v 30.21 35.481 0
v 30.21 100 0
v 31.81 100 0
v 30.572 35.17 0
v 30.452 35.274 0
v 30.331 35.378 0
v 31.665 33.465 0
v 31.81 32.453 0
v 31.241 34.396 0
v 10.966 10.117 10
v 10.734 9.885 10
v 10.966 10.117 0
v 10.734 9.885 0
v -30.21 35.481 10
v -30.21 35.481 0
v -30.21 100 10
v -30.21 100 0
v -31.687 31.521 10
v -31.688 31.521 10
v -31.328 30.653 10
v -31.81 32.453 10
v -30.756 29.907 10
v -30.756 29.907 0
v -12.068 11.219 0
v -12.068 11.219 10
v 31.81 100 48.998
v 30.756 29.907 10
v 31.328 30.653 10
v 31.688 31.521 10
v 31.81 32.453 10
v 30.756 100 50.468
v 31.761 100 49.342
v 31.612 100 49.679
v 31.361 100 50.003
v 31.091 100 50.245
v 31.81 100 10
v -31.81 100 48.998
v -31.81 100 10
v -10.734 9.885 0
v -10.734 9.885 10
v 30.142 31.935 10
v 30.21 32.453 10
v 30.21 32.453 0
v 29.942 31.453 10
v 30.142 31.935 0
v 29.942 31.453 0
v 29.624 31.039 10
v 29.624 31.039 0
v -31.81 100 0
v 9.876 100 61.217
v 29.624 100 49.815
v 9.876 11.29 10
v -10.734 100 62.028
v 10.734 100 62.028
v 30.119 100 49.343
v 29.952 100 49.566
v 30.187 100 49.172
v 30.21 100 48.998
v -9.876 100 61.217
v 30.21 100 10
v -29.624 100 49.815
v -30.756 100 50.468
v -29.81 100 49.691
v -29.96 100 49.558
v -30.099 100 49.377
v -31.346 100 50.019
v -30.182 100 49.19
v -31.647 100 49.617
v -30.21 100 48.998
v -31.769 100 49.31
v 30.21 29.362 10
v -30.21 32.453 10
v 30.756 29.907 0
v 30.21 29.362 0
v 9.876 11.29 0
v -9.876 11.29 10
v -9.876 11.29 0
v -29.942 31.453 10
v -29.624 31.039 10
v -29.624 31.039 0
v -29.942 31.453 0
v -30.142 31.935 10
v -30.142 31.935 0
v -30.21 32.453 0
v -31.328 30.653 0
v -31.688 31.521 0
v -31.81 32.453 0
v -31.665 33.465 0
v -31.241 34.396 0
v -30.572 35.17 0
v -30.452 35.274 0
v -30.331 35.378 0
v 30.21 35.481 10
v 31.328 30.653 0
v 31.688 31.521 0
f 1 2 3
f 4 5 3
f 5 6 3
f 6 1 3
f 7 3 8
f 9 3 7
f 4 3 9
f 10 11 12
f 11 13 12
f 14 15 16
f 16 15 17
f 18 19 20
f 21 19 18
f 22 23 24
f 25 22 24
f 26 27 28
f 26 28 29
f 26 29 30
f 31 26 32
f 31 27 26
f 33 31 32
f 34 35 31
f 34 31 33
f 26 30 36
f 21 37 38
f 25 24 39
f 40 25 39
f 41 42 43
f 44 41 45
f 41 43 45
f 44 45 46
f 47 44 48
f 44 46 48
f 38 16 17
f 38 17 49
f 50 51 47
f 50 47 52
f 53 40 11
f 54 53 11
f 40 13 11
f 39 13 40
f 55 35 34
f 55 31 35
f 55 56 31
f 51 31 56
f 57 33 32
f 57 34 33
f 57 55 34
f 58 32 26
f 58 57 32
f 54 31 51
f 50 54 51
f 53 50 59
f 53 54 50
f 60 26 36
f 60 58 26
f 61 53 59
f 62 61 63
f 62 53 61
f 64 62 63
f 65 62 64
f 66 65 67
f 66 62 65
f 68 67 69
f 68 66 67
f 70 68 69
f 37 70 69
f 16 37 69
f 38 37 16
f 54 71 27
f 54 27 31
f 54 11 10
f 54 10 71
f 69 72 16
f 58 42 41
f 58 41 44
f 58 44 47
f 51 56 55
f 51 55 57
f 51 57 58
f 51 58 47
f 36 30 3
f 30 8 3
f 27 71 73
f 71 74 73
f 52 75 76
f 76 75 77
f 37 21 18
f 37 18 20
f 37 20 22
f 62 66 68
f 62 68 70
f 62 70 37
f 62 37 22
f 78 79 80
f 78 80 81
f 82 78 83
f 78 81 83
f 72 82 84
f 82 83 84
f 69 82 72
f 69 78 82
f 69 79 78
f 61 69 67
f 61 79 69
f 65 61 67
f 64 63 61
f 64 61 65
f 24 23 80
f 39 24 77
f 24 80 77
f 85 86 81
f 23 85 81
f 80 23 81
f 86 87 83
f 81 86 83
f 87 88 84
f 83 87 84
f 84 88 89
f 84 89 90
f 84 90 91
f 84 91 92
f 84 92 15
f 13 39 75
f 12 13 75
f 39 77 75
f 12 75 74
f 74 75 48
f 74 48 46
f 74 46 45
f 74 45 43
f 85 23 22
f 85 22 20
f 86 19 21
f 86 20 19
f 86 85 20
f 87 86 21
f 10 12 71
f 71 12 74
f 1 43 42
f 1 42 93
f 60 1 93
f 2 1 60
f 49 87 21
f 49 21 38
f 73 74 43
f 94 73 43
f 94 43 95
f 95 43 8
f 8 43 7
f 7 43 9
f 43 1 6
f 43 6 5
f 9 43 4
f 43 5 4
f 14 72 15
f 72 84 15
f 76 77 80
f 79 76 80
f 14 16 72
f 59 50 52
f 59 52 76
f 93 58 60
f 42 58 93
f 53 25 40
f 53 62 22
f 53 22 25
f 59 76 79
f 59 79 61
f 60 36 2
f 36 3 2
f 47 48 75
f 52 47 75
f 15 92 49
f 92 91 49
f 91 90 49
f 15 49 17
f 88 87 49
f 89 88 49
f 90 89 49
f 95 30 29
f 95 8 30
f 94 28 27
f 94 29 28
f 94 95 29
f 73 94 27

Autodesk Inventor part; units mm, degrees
ref_plane "YZ Plane" through (0, 0, 0) normal (1, 0, 0) x (0, 1, 0)
sketch "Boceto1" plane through (0, 0, 0) normal (0, 0, 1) x (1, 0, 0)
  circle A0 centre (-50, -88) radius 1.5 projected
  circle A1 centre (50, -88) radius 1.5 projected
  circle A2 centre (88, -50) radius 1.5 projected
  circle A3 centre (88, 50) radius 1.5 projected
  circle A4 centre (50, 88) radius 1.5 projected
  circle A5 centre (-50, 88) radius 1.5 projected
  circle A6 centre (-88, 50) radius 1.5 projected
  circle A7 centre (-88, -50) radius 1.5 projected
  arc A8 (29.6244, 31.0386) -> (29.5223, 33.9623) centre (28.2102, 32.4528) ccw projected
  line L0 (29.6244, 31.0386) -> (9.8759, 11.2901) projected
  line L1 (-9.8759, 11.2901) -> (-29.6244, 31.0386) projected
  arc A9 (-29.5223, 33.9623) -> (-29.6244, 31.0386) centre (-28.2102, 32.4528) ccw projected
  arc A10 (29.5223, 33.9623) -> (-29.5223, 33.9623) centre (0, 0) ccw projected
  line L2 (100, -100) -> (100, 100) projected
  line L3 (100, 100) -> (-100, 100) projected
  line L4 (-100, 100) -> (-100, -100) projected
  line L5 (-100, -100) -> (100, -100) projected
  line L6 (10.7339, 9.8854) -> (30.7558, 29.9072)
  arc A11 (30.7558, 29.9072) -> (30.572, 35.1698) centre (28.2102, 32.4528) ccw
  arc A12 (30.572, 35.1698) -> (-30.572, 35.1698) centre (0, 0) ccw
  arc A13 (-30.572, 35.1698) -> (-30.7558, 29.9072) centre (-28.2102, 32.4528) ccw
  line L7 (-30.7558, 29.9072) -> (-12.0679, 11.2194)
  line L8 (31.8102, 5.2085) -> (31.8102, 100)
  line L9 (30.2102, 29.3617) -> (30.2102, 100)
  line L10 (-31.8102, 32.4528) -> (-31.8102, 100)
  line L11 (-30.2102, 31.7383) -> (-30.2102, 100)
  circle A14 centre (55, 0) radius 2.5 projected
  arc A15 (-5.2203, -12.3413) -> (5.2203, -12.3413) centre (0, 0) ccw projected
  arc A16 (54.4847, -4.9734) -> (5.2203, -12.3413) centre (44.1778, -104.4408) ccw projected
  arc A17 (54.4847, -4.9734) -> (54.4847, 4.9734) centre (55, 0) ccw projected
  arc A18 (11.6313, 9.8854) -> (54.4847, 4.9734) centre (44.1778, 104.4408) ccw projected
  arc A19 (-54.4847, 4.9734) -> (-11.6313, 9.8854) centre (-44.1778, 104.4408) ccw projected
  arc A20 (-54.4847, 4.9734) -> (-54.4847, -4.9734) centre (-55, 0) ccw projected
  arc A21 (-5.2203, -12.3413) -> (-54.4847, -4.9734) centre (-44.1778, -104.4408) ccw projected
  circle A22 centre (0, 0) radius 4 projected
  circle A23 centre (-55, 0) radius 2.5 projected
  arc A24 (9.8759, 11.2901) -> (-9.8759, 11.2901) centre (0, 0) ccw
  line L12 (-30.7558, 29.9072) -> (-10.7339, 9.8854)
  arc A25 (5.2203, 12.3413) -> (-5.2203, 12.3413) centre (0, 0) ccw
  line L13 (10.9657, 10.1171) -> (30.7558, 29.9072)
  arc A26 (30.7558, 29.9072) -> (30.572, 35.1698) centre (28.2102, 32.4528) ccw
  arc A27 (30.572, 35.1698) -> (-30.572, 35.1698) centre (0, 0) ccw
  arc A28 (-30.572, 35.1698) -> (-30.7558, 29.9072) centre (-28.2102, 32.4528) ccw
  line L14 (11.6313, 9.8854) -> (-11.6313, 9.8854) projected
  line L15 (9.8759, 11.2901) -> (-9.8759, 11.2901)
  point P0 (-30.2102, 32.4528)
  point P1 (30.2102, 32.4528)
  point P2 (31.8102, 32.4528)
  point P3 (-30.2102, 35.4811)
  point P4 (31.8102, 32.4528)
  point P5 (30.2102, 35.4811)
  point P6 (44.1778, 104.4408)
  point P7 (-44.1778, 104.4408)
  dimension "d0" = 1.6
ref_plane "Plano de trabajo1" through (-60, -15, 10) normal (0, 0, 1) x (1, 0, 0)
ref_plane "Plano de trabajo3" through (-60, -13.4, 10) normal (0, 0, 1) x (1, 0, 0)
extrude "Extrusión1" add sketch "Boceto1" along normal up to surface (10 mm away) contours A8 L9 L6 L14 L12 L7 A13 A12 L11 A9 L1 L15 L0 | L9 A12 A11 L6 | L9 L3 L8 A11 A12 | A12 A13 L10 L3 L11
ref_plane "Plano de trabajo5" through (0, 32.4528, 0) normal (-1, 0, 0) x (0, 0, 1)
sketch "Boceto4" plane through (0, 32.4528, 0) normal (-1, 0, 0) x (0, 0, 1)
  line L0 (10, -1.4142) -> (10, -21.1627) projected
  line L1 (10, 0) -> (10, -1.4142) projected
  line L2 (10, 67.5472) -> (10, 0) projected
  line L3 (10, 0) -> (10, 67.5472) projected
  line L4 (10, -2.5456) -> (10, 0) projected
  line L5 (10, -22.5674) -> (10, -2.5456) projected
  line L6 (10, -2.5456) -> (10, -22.5674) projected
  line L7 (10, 0) -> (10, -2.5456) projected
  line L8 (10, 67.5472) -> (10, 0) projected
  line L9 (10, 0) -> (10, 67.5472) projected
  line L10 (10, -1.4142) -> (10, 0) projected
  line L11 (10, -21.1627) -> (10, -1.4142) projected
  line L12 (-103, 70.5472) -> (-78, 70.5472) projected
  line L13 (-78, 70.5472) -> (-53, 70.5472) projected
  line L14 (-53, 70.5472) -> (-28, 70.5472) projected
  line L15 (-28, 70.5472) -> (-3, 70.5472) projected
  line L16 (-3, 70.5472) -> (22, 70.5472) projected
  line L17 (22, 70.5472) -> (47, 70.5472) projected
  line L18 (47, 70.5472) -> (72, 70.5472) projected
  line L19 (72, 70.5472) -> (97, 70.5472) projected
  line L20 (97, 70.5472) -> (122, 70.5472) projected
  line L21 (122, 70.5472) -> (147, 70.5472) projected
  line L22 (10, -22.5674) -> (63.7597, 70.5472)
  line L23 (10, -22.5674) -> (117.5195, -22.5674) construction
  point P0 (0, -32.4528)
  dimension "d9" = 60
sketch "Boceto5" plane through (-10.7339, 9.8854, 10) normal (0, 0, 1) x (1, 0, 0)
  line L0 (-18.8905, 21.1532) -> (0.858, 1.4047) projected
  arc A0 (-19.4762, 22.5674) -> (-18.8905, 21.1532) centre (-17.4762, 22.5674) ccw projected
  line L1 (-19.4762, 90.1146) -> (-19.4762, 22.5674) projected
  line L2 (-21.0762, 90.1146) -> (-19.4762, 90.1146) projected
  line L3 (-21.0762, 22.5674) -> (-21.0762, 90.1146) projected
  arc A1 (-21.0762, 22.5674) -> (-20.0218, 20.0218) centre (-17.4762, 22.5674) ccw projected
  line L4 (0, 0) -> (-20.0218, 20.0218) projected
  line L5 (21.4679, 0) -> (0, 0) projected
  line L6 (41.4897, 20.0218) -> (21.4679, 0) projected
  arc A2 (41.4897, 20.0218) -> (42.5441, 22.5674) centre (38.9441, 22.5674) ccw projected
  line L7 (42.5441, 90.1146) -> (42.5441, 22.5674) projected
  line L8 (40.9441, 90.1146) -> (42.5441, 90.1146) projected
  line L9 (40.9441, 22.5674) -> (40.9441, 90.1146) projected
  arc A3 (40.3583, 21.1532) -> (40.9441, 22.5674) centre (38.9441, 22.5674) ccw projected
  line L10 (20.6098, 1.4047) -> (40.3583, 21.1532) projected
  line L11 (0.858, 1.4047) -> (20.6098, 1.4047) projected
  point P0 (10.7339, -9.8854)
sweep "Barrido2" add profiles "Boceto5" path "Boceto4" path curves L22
ref_plane "Plano de trabajo6" through (-31.8102, 100, 0) normal (0, 1, 0) x (1, 0, 0)
split "Dividir2" plane through (-31.8102, 100, 0) removes the side toward (0, 1, 0)
properties part number "Tolva_Salida"
